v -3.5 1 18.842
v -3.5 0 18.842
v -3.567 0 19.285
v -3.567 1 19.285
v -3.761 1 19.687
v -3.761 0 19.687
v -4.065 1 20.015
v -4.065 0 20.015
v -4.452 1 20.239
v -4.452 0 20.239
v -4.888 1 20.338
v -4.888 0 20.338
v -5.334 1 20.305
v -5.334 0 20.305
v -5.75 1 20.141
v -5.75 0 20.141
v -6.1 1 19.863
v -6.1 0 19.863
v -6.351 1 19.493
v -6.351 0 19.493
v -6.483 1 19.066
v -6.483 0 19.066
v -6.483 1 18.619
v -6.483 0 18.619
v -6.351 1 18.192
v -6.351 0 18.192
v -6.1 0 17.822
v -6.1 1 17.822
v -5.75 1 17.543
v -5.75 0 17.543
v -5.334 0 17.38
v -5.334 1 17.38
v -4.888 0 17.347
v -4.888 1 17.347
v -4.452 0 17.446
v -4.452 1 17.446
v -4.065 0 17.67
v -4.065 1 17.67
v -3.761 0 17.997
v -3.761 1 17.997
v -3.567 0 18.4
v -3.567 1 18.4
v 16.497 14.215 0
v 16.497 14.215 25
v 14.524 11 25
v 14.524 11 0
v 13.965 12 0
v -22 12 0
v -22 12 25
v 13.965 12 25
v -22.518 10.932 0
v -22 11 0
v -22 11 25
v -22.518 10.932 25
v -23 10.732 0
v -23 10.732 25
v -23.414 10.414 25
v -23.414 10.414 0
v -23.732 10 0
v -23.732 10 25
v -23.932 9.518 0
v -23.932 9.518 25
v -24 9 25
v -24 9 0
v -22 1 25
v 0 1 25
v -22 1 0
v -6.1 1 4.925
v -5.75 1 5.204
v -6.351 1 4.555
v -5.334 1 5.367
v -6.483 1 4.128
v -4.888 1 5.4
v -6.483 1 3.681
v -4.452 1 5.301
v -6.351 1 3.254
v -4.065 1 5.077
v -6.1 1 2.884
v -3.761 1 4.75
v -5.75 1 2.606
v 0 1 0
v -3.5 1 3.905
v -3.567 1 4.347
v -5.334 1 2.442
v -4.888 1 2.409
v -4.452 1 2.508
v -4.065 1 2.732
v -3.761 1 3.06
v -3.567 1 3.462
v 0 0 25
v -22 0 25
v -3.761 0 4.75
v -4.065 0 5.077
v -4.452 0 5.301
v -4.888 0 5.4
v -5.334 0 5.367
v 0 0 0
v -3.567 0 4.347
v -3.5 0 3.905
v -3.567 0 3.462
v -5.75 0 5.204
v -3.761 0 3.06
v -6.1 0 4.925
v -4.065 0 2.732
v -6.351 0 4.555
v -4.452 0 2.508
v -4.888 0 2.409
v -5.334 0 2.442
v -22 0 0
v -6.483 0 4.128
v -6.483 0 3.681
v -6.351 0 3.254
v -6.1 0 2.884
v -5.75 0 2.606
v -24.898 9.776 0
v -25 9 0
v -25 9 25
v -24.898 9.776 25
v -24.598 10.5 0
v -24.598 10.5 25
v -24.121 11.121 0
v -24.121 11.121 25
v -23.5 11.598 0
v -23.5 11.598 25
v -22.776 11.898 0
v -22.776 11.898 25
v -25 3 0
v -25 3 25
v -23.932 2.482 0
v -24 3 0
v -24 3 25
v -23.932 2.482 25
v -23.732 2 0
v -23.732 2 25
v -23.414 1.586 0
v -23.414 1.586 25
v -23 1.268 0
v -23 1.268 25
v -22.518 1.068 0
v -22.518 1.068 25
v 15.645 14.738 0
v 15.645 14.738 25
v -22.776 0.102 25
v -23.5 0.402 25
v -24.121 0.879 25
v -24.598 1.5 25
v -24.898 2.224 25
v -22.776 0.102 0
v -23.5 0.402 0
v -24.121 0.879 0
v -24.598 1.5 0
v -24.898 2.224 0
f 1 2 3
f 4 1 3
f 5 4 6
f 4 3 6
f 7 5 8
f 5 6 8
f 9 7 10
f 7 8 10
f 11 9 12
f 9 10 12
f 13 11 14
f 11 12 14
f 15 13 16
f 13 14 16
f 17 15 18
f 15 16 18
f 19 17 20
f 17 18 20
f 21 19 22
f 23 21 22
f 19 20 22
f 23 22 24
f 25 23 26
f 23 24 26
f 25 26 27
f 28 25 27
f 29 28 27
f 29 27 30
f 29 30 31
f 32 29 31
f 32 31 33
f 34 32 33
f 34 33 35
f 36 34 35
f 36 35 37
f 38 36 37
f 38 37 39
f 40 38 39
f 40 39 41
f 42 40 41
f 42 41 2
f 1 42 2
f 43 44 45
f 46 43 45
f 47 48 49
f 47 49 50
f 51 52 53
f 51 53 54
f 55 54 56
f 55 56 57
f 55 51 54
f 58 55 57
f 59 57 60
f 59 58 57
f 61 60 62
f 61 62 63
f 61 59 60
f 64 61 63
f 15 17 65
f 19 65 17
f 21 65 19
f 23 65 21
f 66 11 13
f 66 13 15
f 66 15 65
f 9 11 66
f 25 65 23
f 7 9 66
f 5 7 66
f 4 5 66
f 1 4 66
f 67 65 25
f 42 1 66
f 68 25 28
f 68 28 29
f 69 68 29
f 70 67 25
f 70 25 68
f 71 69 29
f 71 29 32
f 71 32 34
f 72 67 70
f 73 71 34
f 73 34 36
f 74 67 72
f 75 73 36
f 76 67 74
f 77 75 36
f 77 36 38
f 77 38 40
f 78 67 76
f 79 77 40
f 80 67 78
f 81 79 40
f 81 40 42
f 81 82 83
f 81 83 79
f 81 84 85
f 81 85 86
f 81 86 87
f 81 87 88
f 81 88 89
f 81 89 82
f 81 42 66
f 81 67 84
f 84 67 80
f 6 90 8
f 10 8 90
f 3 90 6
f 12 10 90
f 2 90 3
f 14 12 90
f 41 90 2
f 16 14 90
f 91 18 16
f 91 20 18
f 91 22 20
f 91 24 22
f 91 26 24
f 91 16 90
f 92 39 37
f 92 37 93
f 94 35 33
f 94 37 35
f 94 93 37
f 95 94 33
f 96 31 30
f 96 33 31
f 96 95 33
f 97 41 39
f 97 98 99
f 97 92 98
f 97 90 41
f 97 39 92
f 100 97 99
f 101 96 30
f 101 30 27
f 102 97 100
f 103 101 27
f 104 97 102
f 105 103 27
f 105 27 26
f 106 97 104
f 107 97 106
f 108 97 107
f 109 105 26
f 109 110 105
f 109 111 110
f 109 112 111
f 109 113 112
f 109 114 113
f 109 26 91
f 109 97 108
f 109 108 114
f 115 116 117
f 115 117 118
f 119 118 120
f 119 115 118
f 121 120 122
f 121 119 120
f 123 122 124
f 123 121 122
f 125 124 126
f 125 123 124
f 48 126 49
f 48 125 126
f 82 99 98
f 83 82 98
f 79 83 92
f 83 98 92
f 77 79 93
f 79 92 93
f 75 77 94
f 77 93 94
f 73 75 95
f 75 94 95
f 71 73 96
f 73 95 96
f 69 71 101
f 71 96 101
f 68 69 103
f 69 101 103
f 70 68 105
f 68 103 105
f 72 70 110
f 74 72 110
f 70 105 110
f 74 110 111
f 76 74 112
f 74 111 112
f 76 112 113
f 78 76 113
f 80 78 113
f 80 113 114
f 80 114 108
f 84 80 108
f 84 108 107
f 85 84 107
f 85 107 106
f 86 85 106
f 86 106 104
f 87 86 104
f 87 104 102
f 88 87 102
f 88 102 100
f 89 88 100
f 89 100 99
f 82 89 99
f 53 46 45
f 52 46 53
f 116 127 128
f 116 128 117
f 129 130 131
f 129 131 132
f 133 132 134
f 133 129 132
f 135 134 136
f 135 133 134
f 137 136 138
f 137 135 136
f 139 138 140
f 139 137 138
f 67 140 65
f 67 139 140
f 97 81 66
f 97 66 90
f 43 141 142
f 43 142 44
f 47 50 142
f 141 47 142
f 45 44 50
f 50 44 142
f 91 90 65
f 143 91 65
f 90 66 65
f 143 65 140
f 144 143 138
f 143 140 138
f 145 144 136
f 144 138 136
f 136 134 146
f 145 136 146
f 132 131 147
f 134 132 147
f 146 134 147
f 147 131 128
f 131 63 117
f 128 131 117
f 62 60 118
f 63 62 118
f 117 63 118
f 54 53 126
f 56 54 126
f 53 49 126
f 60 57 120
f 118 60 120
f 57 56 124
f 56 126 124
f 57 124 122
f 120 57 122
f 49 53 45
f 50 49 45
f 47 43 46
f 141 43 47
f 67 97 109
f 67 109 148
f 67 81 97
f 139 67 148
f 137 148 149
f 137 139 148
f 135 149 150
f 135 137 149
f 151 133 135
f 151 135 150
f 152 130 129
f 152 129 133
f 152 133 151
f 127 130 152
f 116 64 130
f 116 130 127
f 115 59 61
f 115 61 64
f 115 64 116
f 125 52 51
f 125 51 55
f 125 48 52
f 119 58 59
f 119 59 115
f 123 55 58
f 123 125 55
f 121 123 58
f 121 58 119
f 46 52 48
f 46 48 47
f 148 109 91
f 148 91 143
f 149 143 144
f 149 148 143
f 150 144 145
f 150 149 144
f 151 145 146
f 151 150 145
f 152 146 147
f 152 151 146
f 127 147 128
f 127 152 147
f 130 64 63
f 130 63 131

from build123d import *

# Parameters (mm, degrees)
EXTRUS_O_FINA1_DEPTH  = 25
ESBO_O2_R             = 1.5
CORTE_EXTRUS_O1_DEPTH = 5


with BuildPart() as part:
    # Esboço1 → Extrusão-Fina1 (new body)
    with BuildSketch(Plane.XY):
        with BuildLine():
            Line((0, 0), (-22, 0))
            ThreePointArc((-22, 0), (-24.121320344, 0.878679656), (-25, 3))
            Line((-25, 3), (-25, 9))
            ThreePointArc((-25, 9), (-24.121320344, 11.121320344), (-22, 12))
            Line((-22, 12), (-10, 12))
            Line((-10, 12), (13.964550925, 12))
            Line((13.964550925, 12), (15.645056047, 14.73834825))
            Line((15.645056047, 14.73834825), (16.497357261, 14.215296971))
            Line((16.497357261, 14.215296971), (14.524152053, 11))
            Line((14.524152053, 11), (-10, 11))
            Line((-10, 11), (-22, 11))
            ThreePointArc((-22, 11), (-23.414213562, 10.414213562), (-24, 9))
            Line((-24, 9), (-24, 3))
            ThreePointArc((-24, 3), (-23.414213562, 1.585786438), (-22, 1))
            Line((-22, 1), (0, 1))
            Line((0, 1), (0, 0))
        make_face()
    extrude(amount=EXTRUS_O_FINA1_DEPTH)

    # Esboço2 → Corte-extrusão1 (cut)
    with BuildSketch(Plane.XZ):
        with Locations((-5, 18.842376972)):
            Circle(ESBO_O2_R)
        with Locations((-5, 3.904607357)):
            Circle(ESBO_O2_R)
    extrude(amount=-CORTE_EXTRUS_O1_DEPTH, mode=Mode.SUBTRACT)


solid = part.part
